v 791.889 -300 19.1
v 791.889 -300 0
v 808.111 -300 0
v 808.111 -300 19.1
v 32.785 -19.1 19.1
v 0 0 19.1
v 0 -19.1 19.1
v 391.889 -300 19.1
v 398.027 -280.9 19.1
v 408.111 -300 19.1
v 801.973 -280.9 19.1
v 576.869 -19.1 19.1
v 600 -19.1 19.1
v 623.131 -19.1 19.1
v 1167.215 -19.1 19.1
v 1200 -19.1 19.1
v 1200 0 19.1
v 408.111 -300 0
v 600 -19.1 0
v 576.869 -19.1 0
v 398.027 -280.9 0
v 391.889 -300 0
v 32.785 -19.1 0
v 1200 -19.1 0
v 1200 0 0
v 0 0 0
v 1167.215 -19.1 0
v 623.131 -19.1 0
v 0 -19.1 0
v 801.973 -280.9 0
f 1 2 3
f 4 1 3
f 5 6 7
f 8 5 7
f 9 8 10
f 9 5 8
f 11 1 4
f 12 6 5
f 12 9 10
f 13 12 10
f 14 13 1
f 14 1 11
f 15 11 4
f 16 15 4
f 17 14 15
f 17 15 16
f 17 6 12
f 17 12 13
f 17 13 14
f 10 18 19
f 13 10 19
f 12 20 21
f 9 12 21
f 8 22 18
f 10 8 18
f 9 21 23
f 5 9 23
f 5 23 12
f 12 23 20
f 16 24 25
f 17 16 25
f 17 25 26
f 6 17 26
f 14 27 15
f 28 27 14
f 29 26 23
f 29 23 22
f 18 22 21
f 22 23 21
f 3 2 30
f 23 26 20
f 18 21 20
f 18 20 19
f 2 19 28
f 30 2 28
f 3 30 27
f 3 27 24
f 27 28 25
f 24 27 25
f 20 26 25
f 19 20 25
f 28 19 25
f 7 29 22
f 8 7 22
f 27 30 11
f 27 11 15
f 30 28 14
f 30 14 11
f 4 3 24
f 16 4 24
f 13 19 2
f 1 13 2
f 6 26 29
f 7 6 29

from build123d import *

# Parameters (mm, degrees)
BOSS_EXTRUDE2_DEPTH = 19.1


with BuildPart() as part:
    # Sketch3 → Boss-Extrude2 (new body)
    with BuildSketch(Plane.XY):
        Polygon((391.889090758, -300), (408.110909242, -300), (600, -19.1), (791.889090758, -300), (808.110909242, -300), (1200, -19.1), (1200, 0), (0, 0), (0, -19.1), align=None)
        Polygon((32.785074333, -19.1), (576.868833396, -19.1), (398.027381063, -280.9), align=None, mode=Mode.SUBTRACT)
        Polygon((801.972618937, -280.9), (1167.214925667, -19.1), (623.131166604, -19.1), align=None, mode=Mode.SUBTRACT)
    extrude(amount=BOSS_EXTRUDE2_DEPTH)


solid = part.part
